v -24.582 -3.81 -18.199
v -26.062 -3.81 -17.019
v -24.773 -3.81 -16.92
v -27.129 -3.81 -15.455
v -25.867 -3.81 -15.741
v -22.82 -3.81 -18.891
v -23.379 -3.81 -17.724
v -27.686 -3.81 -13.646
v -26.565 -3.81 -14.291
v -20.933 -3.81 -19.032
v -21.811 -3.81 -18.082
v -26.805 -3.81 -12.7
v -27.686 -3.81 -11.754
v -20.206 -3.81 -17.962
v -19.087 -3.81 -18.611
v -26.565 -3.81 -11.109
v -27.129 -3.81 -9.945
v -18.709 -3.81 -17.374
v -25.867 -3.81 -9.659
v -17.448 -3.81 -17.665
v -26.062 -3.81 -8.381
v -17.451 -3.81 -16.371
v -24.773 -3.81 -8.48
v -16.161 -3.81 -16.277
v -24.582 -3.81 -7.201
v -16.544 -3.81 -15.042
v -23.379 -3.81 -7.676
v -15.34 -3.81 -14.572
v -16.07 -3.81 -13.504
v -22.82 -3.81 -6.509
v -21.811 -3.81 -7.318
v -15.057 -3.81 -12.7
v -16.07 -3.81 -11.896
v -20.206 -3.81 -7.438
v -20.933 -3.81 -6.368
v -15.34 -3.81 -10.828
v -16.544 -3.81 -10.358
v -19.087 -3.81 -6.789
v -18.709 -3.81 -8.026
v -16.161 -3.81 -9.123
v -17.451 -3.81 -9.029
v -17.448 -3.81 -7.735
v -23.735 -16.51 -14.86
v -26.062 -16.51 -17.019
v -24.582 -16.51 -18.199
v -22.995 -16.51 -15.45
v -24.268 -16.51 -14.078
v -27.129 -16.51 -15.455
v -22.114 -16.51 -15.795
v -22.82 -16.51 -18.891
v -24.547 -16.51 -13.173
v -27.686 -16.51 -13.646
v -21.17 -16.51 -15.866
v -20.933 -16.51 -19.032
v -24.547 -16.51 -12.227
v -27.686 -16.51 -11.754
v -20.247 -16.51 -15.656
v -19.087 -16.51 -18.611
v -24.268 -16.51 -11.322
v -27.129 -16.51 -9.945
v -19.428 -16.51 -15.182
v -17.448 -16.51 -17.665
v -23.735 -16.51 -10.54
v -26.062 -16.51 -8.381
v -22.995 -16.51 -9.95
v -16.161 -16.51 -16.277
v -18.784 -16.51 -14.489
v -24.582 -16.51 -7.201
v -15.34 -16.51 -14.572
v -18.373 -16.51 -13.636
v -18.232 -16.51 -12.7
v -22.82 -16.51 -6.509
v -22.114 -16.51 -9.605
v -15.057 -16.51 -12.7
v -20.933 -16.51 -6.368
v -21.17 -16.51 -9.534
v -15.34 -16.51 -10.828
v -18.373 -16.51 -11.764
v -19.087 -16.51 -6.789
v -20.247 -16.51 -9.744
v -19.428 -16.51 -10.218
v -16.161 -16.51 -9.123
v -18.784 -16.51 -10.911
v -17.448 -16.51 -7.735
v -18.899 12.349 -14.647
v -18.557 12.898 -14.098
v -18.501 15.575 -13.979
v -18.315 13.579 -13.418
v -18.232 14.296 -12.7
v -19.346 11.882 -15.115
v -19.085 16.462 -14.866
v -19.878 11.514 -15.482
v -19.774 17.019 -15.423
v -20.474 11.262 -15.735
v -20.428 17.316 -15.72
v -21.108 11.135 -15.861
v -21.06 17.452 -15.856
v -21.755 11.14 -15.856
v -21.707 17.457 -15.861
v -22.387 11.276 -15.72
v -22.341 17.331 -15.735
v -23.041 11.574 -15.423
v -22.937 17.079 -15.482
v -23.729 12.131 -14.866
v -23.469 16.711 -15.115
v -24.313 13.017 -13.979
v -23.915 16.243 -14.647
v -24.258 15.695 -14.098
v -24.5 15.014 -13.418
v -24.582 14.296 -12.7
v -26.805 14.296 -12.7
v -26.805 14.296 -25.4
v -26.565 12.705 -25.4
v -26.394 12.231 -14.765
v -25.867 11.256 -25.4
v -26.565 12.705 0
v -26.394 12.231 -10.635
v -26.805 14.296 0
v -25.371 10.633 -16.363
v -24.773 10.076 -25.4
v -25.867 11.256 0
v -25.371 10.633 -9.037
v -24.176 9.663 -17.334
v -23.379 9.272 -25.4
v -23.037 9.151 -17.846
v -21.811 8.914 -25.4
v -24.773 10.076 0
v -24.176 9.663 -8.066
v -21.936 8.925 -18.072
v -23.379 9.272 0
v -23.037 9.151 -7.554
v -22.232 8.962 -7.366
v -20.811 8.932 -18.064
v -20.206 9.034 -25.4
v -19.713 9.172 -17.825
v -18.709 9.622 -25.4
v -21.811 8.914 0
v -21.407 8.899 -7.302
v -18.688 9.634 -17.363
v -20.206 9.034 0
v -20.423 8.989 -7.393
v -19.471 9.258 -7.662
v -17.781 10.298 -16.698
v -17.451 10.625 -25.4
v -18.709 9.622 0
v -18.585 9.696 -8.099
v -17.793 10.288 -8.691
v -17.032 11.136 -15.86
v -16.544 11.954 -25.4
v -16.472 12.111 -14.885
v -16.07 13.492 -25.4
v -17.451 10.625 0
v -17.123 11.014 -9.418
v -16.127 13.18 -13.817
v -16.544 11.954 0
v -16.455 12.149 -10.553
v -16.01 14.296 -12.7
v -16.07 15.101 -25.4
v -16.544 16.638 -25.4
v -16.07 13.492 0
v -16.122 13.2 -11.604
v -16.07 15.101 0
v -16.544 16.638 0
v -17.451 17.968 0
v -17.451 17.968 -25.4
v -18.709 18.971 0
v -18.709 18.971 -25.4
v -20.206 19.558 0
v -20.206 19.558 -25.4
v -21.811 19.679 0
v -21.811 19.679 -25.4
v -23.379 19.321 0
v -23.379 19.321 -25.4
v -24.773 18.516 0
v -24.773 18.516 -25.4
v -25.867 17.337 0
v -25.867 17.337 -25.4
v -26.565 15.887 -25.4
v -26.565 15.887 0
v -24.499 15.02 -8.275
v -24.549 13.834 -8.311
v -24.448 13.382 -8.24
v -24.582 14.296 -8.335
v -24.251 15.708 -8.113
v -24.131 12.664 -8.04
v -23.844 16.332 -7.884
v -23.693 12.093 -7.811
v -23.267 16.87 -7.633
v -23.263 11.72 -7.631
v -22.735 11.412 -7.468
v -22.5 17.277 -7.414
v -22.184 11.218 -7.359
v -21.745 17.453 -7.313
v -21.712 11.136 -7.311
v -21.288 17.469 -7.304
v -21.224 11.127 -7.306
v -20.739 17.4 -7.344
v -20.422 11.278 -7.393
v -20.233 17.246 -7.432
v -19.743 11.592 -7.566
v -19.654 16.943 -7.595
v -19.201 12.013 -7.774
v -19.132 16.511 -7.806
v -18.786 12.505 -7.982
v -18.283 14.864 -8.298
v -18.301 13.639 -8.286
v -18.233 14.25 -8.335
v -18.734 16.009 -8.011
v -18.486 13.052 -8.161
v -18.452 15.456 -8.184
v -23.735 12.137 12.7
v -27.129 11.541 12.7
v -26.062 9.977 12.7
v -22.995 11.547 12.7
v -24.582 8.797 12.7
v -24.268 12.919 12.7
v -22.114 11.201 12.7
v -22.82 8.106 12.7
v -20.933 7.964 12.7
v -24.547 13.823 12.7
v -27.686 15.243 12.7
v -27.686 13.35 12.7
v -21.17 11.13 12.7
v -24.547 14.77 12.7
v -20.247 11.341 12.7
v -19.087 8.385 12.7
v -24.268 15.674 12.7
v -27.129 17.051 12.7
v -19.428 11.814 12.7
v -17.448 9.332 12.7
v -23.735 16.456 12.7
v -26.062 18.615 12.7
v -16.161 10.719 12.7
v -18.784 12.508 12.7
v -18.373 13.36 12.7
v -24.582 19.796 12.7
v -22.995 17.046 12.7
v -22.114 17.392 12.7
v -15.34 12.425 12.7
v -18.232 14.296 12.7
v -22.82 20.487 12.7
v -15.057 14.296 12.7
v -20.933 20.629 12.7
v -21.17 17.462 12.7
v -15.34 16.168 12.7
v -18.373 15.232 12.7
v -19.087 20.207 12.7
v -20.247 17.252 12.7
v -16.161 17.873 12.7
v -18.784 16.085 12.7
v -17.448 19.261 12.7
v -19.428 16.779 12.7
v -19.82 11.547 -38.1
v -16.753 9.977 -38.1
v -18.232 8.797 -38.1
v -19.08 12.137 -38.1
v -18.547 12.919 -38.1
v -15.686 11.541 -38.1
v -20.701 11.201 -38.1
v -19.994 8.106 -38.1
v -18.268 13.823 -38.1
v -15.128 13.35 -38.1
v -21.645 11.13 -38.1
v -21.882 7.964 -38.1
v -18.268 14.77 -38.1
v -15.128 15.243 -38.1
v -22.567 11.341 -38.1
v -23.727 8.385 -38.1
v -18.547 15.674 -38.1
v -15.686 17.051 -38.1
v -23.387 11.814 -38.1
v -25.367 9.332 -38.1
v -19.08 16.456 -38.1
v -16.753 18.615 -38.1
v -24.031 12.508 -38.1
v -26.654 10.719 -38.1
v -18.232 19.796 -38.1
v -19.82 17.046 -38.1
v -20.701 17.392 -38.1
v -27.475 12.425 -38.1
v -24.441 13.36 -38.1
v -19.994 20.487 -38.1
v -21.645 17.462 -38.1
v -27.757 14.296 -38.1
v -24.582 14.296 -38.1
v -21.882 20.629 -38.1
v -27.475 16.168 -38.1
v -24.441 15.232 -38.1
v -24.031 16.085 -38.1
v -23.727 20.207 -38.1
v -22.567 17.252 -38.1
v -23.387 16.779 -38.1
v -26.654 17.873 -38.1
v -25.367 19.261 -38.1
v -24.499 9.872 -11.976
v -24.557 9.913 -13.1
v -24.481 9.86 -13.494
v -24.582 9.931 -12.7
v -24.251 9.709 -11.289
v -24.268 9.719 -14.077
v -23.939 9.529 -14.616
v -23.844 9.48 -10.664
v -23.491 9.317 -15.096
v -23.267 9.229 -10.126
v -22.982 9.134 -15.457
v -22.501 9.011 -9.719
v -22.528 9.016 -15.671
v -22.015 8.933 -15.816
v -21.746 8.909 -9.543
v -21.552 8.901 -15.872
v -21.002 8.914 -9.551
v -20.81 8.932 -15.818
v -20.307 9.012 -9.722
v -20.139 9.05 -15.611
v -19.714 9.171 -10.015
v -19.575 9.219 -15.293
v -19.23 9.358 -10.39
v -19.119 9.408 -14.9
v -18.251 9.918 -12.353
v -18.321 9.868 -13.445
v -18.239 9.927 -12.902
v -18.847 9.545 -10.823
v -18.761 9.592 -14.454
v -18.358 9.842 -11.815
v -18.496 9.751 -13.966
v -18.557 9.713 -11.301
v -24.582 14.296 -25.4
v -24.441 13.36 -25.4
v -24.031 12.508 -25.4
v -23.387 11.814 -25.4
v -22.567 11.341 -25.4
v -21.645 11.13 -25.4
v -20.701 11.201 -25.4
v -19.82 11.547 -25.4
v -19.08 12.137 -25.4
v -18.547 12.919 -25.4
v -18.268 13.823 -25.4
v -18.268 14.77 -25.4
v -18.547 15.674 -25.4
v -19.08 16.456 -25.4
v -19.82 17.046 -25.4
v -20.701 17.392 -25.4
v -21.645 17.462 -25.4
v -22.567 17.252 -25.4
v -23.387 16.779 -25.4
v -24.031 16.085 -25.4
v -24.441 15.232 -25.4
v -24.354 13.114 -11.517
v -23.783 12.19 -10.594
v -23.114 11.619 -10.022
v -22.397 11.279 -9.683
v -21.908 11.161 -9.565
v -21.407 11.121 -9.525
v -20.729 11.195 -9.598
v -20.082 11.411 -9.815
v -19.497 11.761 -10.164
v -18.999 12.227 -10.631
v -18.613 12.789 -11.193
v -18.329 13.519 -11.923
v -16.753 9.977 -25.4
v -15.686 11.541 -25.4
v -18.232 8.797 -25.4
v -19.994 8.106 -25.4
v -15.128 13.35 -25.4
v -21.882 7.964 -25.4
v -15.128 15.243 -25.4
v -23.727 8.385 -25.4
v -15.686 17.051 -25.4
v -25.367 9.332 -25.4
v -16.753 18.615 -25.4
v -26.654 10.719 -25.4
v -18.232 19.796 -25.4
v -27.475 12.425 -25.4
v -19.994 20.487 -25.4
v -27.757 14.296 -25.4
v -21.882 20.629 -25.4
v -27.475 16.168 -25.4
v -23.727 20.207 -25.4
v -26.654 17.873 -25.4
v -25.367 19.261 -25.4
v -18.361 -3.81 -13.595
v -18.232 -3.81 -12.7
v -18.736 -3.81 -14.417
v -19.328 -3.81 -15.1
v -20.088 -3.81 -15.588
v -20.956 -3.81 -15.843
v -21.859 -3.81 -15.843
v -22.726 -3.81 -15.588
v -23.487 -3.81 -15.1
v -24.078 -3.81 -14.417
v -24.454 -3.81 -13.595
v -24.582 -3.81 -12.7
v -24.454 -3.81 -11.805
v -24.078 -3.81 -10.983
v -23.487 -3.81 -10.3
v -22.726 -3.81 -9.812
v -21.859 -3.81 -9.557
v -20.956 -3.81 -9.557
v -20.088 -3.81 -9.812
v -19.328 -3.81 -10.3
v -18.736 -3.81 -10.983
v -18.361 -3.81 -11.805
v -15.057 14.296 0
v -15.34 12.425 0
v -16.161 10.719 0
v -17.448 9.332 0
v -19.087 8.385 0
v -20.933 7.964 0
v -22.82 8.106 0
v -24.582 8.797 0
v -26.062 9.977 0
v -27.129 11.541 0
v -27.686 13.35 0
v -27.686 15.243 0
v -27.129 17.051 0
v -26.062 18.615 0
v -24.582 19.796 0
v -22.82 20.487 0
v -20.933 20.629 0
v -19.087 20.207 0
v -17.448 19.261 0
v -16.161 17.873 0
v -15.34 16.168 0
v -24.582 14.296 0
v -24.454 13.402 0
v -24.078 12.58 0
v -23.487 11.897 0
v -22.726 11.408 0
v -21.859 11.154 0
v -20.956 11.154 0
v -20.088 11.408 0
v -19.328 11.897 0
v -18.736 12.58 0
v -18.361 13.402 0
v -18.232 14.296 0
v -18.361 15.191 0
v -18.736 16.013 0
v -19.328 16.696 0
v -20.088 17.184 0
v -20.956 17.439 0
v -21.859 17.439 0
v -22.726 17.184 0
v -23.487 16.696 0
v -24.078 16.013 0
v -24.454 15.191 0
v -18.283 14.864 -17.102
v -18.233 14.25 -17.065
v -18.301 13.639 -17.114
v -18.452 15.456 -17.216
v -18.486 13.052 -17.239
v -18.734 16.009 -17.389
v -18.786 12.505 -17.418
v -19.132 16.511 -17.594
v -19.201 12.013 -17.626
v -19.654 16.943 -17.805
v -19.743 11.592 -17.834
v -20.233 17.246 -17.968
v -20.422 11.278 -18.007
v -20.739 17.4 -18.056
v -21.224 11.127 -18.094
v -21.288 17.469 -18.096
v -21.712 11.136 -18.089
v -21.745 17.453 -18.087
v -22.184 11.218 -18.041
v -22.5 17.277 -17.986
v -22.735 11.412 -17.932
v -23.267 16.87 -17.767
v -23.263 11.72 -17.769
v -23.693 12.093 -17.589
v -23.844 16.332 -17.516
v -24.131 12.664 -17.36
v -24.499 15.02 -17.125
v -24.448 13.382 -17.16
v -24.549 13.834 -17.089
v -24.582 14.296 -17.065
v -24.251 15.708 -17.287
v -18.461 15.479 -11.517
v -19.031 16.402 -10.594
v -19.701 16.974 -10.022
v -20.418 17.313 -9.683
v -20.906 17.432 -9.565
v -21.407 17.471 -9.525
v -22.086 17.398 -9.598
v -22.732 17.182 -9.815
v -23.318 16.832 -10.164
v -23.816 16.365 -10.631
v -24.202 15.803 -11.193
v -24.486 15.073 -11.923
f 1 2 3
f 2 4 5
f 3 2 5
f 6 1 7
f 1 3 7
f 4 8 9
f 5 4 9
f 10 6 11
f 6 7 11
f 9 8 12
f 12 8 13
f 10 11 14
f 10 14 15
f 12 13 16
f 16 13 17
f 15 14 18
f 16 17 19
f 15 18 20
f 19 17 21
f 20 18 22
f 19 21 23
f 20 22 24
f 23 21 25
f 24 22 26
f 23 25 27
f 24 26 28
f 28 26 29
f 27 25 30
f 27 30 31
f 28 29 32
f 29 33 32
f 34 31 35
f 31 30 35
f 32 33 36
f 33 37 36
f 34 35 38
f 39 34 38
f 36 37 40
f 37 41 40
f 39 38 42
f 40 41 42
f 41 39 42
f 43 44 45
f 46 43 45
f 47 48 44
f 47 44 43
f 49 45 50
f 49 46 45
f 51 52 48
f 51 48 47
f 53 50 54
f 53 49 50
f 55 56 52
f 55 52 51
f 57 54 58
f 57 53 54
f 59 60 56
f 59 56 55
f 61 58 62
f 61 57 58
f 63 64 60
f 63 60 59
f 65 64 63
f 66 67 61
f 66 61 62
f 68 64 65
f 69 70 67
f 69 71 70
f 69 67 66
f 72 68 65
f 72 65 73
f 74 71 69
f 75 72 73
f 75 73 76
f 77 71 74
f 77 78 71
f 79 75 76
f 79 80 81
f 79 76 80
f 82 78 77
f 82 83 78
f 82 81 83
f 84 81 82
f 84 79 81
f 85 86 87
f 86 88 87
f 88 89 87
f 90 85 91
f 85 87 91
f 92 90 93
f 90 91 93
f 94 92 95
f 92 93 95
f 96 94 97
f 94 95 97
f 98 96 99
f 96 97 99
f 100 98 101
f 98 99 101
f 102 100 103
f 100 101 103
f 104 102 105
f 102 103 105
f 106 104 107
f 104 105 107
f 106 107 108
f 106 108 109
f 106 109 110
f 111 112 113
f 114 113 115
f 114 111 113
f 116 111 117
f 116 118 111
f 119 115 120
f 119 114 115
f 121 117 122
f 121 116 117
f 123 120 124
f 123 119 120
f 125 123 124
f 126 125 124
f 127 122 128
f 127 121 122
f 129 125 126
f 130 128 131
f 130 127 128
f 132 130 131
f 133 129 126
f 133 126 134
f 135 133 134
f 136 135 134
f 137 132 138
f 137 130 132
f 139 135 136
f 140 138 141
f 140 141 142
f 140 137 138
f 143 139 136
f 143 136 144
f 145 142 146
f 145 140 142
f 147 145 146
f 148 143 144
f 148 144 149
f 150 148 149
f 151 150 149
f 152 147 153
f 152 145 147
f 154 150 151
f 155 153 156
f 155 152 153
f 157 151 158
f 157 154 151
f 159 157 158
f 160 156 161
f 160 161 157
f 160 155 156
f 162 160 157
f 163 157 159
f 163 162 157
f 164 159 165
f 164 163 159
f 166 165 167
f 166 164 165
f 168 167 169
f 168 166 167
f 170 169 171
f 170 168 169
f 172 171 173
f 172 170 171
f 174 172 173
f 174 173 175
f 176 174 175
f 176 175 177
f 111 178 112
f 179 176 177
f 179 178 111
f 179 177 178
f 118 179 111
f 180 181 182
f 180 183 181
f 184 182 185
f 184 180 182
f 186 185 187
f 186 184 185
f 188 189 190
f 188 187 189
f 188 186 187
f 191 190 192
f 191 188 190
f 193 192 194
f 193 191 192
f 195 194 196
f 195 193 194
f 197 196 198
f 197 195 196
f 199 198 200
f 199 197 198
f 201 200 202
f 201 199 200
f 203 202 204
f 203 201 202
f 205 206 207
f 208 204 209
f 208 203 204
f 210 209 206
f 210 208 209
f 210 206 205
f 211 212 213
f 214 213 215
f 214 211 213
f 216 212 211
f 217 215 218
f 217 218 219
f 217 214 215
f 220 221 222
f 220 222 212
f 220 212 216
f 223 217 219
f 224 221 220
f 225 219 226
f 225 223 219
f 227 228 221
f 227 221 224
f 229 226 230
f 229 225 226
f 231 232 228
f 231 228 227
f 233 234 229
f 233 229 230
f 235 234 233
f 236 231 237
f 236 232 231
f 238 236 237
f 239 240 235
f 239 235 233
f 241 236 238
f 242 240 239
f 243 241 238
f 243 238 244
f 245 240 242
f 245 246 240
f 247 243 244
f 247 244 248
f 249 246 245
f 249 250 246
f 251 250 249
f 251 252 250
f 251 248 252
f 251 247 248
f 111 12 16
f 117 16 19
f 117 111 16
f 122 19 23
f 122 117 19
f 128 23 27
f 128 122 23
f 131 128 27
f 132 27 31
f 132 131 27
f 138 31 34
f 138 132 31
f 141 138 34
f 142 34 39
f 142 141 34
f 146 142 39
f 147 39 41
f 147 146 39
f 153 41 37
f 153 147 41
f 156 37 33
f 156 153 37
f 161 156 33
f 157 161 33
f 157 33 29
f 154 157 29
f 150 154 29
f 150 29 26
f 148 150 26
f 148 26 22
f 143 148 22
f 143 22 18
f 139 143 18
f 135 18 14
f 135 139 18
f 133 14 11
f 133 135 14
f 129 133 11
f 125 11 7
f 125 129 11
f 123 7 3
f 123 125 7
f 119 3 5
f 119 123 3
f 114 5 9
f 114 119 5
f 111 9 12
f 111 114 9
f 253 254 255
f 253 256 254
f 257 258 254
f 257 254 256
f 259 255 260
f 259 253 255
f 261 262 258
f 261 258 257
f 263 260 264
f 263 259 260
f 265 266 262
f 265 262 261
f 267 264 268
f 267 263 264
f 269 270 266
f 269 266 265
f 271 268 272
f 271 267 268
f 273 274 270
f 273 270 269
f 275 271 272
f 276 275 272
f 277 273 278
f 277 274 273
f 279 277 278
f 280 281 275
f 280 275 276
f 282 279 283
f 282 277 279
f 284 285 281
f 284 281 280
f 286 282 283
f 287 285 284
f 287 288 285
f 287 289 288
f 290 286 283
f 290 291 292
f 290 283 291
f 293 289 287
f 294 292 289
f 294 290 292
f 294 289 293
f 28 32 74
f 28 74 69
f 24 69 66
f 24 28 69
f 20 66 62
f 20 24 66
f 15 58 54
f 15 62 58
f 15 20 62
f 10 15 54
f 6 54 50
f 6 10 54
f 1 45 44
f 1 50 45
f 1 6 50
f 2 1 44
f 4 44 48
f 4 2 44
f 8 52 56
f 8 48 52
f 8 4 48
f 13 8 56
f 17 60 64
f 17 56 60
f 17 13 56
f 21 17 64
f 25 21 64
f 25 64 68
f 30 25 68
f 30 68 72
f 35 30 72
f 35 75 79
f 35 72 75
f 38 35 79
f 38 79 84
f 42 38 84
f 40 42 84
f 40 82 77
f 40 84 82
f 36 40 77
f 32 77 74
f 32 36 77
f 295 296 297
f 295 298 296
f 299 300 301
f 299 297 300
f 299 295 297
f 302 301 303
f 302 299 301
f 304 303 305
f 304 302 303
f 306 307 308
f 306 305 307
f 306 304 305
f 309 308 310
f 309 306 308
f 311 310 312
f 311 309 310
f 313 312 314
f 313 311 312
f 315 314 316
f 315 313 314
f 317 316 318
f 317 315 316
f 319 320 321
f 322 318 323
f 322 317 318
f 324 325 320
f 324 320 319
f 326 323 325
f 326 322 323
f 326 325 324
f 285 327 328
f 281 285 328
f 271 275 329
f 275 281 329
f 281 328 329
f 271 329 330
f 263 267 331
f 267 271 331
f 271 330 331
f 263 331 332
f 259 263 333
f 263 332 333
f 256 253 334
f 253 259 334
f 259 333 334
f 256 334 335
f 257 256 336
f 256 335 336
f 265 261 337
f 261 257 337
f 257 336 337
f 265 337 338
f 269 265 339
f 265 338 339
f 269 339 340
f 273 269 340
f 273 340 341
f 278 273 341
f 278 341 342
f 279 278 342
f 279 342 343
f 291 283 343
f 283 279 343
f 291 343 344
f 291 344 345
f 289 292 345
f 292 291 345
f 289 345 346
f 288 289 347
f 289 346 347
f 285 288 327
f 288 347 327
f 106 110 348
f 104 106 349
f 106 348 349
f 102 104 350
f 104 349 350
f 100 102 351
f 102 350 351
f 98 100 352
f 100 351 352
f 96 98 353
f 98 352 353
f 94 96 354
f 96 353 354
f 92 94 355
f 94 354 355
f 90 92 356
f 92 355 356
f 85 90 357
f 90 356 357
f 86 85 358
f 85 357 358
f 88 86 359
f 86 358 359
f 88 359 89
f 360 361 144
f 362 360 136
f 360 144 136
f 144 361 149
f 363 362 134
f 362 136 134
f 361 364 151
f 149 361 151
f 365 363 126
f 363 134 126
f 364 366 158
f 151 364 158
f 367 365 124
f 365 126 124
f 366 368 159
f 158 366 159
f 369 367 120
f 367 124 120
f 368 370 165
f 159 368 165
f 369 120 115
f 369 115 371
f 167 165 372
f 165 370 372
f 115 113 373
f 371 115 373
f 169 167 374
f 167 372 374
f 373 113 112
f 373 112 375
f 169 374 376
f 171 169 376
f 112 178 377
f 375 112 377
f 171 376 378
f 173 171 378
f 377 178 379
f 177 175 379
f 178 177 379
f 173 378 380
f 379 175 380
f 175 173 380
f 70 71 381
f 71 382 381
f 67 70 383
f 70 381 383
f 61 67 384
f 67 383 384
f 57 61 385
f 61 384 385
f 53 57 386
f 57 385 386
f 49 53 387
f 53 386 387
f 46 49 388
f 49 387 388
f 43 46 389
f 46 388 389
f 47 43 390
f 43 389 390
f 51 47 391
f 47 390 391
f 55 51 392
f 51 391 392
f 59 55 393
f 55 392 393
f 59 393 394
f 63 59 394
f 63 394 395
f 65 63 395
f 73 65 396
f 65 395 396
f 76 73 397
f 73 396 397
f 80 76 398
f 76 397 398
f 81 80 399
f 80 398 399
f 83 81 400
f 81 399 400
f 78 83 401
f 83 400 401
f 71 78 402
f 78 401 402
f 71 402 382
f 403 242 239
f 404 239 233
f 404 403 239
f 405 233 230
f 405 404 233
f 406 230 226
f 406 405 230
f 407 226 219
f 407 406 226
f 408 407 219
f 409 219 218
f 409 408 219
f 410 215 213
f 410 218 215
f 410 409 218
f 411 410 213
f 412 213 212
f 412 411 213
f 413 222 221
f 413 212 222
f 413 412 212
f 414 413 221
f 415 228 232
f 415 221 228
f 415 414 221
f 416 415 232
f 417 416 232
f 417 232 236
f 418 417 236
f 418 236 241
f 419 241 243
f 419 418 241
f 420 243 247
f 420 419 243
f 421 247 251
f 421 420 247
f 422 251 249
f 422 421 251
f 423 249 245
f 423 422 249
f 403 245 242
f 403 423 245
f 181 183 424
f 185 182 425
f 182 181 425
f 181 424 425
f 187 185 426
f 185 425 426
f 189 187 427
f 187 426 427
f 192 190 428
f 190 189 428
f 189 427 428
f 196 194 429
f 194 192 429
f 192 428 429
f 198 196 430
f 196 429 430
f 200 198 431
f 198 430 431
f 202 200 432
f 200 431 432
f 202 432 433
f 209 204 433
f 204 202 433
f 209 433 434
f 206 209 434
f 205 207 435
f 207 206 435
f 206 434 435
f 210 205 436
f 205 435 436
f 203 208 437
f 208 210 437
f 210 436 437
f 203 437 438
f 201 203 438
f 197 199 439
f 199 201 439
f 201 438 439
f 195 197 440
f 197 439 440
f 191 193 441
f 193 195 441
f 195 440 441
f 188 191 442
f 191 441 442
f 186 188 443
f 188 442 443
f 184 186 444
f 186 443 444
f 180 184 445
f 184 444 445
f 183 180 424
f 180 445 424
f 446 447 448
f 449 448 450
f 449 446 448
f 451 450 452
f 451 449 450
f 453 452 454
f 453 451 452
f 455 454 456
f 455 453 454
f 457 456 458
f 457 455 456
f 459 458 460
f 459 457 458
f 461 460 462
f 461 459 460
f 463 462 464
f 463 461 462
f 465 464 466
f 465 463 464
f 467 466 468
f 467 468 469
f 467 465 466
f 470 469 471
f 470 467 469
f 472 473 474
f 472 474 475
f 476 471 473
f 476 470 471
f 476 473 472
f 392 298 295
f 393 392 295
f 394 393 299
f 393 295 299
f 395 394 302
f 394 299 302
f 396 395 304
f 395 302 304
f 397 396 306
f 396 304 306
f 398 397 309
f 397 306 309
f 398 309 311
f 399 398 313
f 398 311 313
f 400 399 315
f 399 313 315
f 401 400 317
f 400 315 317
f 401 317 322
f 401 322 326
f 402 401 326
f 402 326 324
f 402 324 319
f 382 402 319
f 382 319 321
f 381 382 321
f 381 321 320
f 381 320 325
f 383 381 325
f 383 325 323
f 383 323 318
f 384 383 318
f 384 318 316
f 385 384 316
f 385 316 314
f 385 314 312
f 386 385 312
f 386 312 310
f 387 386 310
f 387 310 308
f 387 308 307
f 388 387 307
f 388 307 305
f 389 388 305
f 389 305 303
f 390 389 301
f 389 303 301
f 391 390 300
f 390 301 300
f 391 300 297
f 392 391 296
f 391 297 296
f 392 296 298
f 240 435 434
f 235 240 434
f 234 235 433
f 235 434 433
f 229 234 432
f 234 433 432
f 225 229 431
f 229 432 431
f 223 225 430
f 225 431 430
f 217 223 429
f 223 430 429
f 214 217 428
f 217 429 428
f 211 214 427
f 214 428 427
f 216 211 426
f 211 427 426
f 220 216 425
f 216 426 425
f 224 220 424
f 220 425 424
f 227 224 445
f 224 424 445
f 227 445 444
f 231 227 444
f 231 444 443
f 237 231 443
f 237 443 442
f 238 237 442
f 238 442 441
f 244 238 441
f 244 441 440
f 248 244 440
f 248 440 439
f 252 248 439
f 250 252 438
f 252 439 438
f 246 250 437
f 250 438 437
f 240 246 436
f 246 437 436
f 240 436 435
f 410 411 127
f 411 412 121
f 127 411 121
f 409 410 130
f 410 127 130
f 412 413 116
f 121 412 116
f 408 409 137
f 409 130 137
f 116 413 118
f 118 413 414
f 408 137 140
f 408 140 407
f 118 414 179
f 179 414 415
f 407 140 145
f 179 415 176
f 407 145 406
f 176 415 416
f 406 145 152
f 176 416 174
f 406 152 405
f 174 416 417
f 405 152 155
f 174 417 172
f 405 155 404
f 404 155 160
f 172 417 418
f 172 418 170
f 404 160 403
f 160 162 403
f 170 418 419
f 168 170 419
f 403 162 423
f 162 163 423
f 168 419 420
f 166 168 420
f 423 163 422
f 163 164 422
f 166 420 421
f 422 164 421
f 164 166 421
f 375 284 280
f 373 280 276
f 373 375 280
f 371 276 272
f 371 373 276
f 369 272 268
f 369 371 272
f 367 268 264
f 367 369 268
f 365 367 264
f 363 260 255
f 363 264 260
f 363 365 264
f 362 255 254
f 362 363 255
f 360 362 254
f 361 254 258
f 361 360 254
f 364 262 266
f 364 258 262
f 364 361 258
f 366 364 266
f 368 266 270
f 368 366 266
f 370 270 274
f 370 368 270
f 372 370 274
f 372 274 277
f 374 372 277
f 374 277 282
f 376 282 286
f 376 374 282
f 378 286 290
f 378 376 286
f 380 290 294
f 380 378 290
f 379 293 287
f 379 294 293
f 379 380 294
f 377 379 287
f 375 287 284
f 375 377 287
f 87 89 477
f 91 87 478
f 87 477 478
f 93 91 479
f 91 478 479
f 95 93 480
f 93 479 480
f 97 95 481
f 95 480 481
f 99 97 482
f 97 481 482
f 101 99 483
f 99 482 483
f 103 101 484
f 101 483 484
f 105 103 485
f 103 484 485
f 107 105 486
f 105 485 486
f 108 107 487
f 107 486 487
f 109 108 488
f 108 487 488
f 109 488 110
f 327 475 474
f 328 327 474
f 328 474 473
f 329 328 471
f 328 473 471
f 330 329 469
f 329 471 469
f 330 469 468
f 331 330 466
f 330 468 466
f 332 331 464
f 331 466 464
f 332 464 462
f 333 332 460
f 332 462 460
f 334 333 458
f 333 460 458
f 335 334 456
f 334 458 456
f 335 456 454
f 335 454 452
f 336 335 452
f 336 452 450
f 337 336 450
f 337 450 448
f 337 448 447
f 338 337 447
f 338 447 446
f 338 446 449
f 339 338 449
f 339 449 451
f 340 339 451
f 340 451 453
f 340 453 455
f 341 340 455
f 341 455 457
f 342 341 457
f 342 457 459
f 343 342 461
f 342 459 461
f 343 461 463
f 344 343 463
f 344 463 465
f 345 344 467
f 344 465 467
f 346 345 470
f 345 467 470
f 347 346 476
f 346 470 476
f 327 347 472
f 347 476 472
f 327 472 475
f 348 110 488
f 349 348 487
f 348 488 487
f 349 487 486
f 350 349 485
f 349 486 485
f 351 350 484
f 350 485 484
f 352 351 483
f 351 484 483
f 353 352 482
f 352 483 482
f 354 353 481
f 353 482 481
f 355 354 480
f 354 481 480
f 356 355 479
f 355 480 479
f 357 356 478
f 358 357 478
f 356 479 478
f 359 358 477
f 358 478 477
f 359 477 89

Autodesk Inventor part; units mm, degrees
ref_plane "YZ Plane" through (0, 0, 0) normal (1, 0, 0) x (0, 1, 0)
sketch "Sketch1" plane through (0, 0, 0) normal (0, 0, 1) x (1, 0, 0)
  circle A0 centre (-21.4074, 14.2963) radius 6.35
  circle A1 centre (-21.4074, 14.2963) radius 3.175
  point P0 (0, 0)
  dimension "d0" = 12.7
  dimension "d1" = 6.35
extrude "Extrusion1" add sketch "Sketch1" along normal blind 12.7
sketch "Sketch2" plane through (-21.4074, 14.2963, 0) normal (0, 0, -1) x (-1, 0, 0)
  circle A0 centre (0, 0) radius 3.175 projected
  circle A1 centre (0, 0) radius 6.35 projected
  circle A2 centre (0, 0) radius 5.3975
  point P0 (-21.4074, -14.2963)
  dimension "d4" = 10.795
extrude "Extrusion2" add sketch "Sketch2" along normal blind 25.4 contours A2
sketch "Sketch3" plane through (-21.4074, 14.2963, -25.4) normal (0, 0, -1) x (-1, 0, 0)
  circle A0 centre (0, 0) radius 3.175 projected
  circle A1 centre (0, 0) radius 5.3975 projected
  circle A2 centre (0, 0) radius 6.35
  point P0 (-21.4074, -14.2963)
  dimension "d7" = 12.7
extrude "Extrusion3" add sketch "Sketch3" along normal blind 12.7 contours A1 | A2
ref_plane "Work Plane3" through (0, 19.685, 0) normal (0, 1, 0) x (-1, 0, 0)
sketch "Sketch4" plane through (0, 19.685, 0) normal (0, 1, 0) x (-1, 0, 0)
  line L0 (26.8049, -25.4) -> (16.0099, -25.4) projected
  line L1 (26.8049, 0) -> (16.0099, 0) projected
  line L2 (26.8049, 0) -> (26.8049, -25.4) projected
  line L3 (16.0099, 0) -> (16.0099, -25.4) projected
  circle A0 centre (21.4074, -12.7) radius 5.3975
  circle A1 centre (21.4074, -12.7) radius 3.175
  point P0 (0, 0)
  dimension "d13" = 6.35
extrude "Extrusion4" add sketch "Sketch4" against normal blind 23.495 contours A0
sketch "Sketch5" plane through (-21.4074, -3.81, -12.7) normal (0, -1, 0) x (1, 0, 0)
  circle A0 centre (0, 0) radius 3.175 projected
  circle A1 centre (0, 0) radius 5.3975 projected
  circle A2 centre (0, 0) radius 6.35
  point P0 (21.4074, 12.7)
  dimension "d16" = 12.7
extrude "Extrusion5" add sketch "Sketch5" along normal blind 12.7 contours A1 | A2
ref_plane "Work Plane5" through (0, 0, 0) normal (0, 0, 1) x (1, 0, 0)
sketch "Sketch7" plane through (0, 0, 0) normal (0, 0, 1) x (1, 0, 0)
  circle A0 centre (-21.4074, 14.2963) radius 5.3975 projected
  circle A1 centre (-21.4074, 14.2963) radius 5.3975
  line L0 (-16.0099, 19.6938) -> (-26.8049, 19.6938)
  line L1 (-26.8049, 19.6938) -> (-26.8049, 8.8988)
  line L2 (-26.8049, 8.8988) -> (-16.0099, 8.8988)
  line L3 (-16.0099, 8.8988) -> (-16.0099, 19.6938)
  line L4 (-16.0099, 14.2963) -> (-26.8049, 14.2963)
  line L5 (-16.0099, 14.2963) -> (-26.8049, 14.2963)
  line L6 (-26.8049, 14.2963) -> (-26.8049, 8.8988)
  line L7 (-26.8049, 8.8988) -> (-16.0099, 8.8988)
  line L8 (-16.0099, 8.8988) -> (-16.0099, 14.2963)
  arc A2 (-26.8049, 14.2963) -> (-16.0099, 14.2963) centre (-21.4074, 14.2963) ccw
  line L9 (-16.0099, 19.6938) -> (-26.8049, 19.6938)
  line L10 (-26.8049, 19.6938) -> (-26.8049, 14.2963)
  line L11 (-26.8049, 14.2963) -> (-16.0099, 14.2963)
  line L12 (-16.0099, 14.2963) -> (-16.0099, 19.6938)
  arc A3 (-16.0099, 14.2963) -> (-26.8049, 14.2963) centre (-21.4074, 14.2963) ccw
  point P0 (0, 0)
extrude "Extrusion7" cut sketch "Sketch7" against normal blind 25.4 contours A0 L0 L3 | A0 L1 L0
properties part number "Joiner Base 1764"
